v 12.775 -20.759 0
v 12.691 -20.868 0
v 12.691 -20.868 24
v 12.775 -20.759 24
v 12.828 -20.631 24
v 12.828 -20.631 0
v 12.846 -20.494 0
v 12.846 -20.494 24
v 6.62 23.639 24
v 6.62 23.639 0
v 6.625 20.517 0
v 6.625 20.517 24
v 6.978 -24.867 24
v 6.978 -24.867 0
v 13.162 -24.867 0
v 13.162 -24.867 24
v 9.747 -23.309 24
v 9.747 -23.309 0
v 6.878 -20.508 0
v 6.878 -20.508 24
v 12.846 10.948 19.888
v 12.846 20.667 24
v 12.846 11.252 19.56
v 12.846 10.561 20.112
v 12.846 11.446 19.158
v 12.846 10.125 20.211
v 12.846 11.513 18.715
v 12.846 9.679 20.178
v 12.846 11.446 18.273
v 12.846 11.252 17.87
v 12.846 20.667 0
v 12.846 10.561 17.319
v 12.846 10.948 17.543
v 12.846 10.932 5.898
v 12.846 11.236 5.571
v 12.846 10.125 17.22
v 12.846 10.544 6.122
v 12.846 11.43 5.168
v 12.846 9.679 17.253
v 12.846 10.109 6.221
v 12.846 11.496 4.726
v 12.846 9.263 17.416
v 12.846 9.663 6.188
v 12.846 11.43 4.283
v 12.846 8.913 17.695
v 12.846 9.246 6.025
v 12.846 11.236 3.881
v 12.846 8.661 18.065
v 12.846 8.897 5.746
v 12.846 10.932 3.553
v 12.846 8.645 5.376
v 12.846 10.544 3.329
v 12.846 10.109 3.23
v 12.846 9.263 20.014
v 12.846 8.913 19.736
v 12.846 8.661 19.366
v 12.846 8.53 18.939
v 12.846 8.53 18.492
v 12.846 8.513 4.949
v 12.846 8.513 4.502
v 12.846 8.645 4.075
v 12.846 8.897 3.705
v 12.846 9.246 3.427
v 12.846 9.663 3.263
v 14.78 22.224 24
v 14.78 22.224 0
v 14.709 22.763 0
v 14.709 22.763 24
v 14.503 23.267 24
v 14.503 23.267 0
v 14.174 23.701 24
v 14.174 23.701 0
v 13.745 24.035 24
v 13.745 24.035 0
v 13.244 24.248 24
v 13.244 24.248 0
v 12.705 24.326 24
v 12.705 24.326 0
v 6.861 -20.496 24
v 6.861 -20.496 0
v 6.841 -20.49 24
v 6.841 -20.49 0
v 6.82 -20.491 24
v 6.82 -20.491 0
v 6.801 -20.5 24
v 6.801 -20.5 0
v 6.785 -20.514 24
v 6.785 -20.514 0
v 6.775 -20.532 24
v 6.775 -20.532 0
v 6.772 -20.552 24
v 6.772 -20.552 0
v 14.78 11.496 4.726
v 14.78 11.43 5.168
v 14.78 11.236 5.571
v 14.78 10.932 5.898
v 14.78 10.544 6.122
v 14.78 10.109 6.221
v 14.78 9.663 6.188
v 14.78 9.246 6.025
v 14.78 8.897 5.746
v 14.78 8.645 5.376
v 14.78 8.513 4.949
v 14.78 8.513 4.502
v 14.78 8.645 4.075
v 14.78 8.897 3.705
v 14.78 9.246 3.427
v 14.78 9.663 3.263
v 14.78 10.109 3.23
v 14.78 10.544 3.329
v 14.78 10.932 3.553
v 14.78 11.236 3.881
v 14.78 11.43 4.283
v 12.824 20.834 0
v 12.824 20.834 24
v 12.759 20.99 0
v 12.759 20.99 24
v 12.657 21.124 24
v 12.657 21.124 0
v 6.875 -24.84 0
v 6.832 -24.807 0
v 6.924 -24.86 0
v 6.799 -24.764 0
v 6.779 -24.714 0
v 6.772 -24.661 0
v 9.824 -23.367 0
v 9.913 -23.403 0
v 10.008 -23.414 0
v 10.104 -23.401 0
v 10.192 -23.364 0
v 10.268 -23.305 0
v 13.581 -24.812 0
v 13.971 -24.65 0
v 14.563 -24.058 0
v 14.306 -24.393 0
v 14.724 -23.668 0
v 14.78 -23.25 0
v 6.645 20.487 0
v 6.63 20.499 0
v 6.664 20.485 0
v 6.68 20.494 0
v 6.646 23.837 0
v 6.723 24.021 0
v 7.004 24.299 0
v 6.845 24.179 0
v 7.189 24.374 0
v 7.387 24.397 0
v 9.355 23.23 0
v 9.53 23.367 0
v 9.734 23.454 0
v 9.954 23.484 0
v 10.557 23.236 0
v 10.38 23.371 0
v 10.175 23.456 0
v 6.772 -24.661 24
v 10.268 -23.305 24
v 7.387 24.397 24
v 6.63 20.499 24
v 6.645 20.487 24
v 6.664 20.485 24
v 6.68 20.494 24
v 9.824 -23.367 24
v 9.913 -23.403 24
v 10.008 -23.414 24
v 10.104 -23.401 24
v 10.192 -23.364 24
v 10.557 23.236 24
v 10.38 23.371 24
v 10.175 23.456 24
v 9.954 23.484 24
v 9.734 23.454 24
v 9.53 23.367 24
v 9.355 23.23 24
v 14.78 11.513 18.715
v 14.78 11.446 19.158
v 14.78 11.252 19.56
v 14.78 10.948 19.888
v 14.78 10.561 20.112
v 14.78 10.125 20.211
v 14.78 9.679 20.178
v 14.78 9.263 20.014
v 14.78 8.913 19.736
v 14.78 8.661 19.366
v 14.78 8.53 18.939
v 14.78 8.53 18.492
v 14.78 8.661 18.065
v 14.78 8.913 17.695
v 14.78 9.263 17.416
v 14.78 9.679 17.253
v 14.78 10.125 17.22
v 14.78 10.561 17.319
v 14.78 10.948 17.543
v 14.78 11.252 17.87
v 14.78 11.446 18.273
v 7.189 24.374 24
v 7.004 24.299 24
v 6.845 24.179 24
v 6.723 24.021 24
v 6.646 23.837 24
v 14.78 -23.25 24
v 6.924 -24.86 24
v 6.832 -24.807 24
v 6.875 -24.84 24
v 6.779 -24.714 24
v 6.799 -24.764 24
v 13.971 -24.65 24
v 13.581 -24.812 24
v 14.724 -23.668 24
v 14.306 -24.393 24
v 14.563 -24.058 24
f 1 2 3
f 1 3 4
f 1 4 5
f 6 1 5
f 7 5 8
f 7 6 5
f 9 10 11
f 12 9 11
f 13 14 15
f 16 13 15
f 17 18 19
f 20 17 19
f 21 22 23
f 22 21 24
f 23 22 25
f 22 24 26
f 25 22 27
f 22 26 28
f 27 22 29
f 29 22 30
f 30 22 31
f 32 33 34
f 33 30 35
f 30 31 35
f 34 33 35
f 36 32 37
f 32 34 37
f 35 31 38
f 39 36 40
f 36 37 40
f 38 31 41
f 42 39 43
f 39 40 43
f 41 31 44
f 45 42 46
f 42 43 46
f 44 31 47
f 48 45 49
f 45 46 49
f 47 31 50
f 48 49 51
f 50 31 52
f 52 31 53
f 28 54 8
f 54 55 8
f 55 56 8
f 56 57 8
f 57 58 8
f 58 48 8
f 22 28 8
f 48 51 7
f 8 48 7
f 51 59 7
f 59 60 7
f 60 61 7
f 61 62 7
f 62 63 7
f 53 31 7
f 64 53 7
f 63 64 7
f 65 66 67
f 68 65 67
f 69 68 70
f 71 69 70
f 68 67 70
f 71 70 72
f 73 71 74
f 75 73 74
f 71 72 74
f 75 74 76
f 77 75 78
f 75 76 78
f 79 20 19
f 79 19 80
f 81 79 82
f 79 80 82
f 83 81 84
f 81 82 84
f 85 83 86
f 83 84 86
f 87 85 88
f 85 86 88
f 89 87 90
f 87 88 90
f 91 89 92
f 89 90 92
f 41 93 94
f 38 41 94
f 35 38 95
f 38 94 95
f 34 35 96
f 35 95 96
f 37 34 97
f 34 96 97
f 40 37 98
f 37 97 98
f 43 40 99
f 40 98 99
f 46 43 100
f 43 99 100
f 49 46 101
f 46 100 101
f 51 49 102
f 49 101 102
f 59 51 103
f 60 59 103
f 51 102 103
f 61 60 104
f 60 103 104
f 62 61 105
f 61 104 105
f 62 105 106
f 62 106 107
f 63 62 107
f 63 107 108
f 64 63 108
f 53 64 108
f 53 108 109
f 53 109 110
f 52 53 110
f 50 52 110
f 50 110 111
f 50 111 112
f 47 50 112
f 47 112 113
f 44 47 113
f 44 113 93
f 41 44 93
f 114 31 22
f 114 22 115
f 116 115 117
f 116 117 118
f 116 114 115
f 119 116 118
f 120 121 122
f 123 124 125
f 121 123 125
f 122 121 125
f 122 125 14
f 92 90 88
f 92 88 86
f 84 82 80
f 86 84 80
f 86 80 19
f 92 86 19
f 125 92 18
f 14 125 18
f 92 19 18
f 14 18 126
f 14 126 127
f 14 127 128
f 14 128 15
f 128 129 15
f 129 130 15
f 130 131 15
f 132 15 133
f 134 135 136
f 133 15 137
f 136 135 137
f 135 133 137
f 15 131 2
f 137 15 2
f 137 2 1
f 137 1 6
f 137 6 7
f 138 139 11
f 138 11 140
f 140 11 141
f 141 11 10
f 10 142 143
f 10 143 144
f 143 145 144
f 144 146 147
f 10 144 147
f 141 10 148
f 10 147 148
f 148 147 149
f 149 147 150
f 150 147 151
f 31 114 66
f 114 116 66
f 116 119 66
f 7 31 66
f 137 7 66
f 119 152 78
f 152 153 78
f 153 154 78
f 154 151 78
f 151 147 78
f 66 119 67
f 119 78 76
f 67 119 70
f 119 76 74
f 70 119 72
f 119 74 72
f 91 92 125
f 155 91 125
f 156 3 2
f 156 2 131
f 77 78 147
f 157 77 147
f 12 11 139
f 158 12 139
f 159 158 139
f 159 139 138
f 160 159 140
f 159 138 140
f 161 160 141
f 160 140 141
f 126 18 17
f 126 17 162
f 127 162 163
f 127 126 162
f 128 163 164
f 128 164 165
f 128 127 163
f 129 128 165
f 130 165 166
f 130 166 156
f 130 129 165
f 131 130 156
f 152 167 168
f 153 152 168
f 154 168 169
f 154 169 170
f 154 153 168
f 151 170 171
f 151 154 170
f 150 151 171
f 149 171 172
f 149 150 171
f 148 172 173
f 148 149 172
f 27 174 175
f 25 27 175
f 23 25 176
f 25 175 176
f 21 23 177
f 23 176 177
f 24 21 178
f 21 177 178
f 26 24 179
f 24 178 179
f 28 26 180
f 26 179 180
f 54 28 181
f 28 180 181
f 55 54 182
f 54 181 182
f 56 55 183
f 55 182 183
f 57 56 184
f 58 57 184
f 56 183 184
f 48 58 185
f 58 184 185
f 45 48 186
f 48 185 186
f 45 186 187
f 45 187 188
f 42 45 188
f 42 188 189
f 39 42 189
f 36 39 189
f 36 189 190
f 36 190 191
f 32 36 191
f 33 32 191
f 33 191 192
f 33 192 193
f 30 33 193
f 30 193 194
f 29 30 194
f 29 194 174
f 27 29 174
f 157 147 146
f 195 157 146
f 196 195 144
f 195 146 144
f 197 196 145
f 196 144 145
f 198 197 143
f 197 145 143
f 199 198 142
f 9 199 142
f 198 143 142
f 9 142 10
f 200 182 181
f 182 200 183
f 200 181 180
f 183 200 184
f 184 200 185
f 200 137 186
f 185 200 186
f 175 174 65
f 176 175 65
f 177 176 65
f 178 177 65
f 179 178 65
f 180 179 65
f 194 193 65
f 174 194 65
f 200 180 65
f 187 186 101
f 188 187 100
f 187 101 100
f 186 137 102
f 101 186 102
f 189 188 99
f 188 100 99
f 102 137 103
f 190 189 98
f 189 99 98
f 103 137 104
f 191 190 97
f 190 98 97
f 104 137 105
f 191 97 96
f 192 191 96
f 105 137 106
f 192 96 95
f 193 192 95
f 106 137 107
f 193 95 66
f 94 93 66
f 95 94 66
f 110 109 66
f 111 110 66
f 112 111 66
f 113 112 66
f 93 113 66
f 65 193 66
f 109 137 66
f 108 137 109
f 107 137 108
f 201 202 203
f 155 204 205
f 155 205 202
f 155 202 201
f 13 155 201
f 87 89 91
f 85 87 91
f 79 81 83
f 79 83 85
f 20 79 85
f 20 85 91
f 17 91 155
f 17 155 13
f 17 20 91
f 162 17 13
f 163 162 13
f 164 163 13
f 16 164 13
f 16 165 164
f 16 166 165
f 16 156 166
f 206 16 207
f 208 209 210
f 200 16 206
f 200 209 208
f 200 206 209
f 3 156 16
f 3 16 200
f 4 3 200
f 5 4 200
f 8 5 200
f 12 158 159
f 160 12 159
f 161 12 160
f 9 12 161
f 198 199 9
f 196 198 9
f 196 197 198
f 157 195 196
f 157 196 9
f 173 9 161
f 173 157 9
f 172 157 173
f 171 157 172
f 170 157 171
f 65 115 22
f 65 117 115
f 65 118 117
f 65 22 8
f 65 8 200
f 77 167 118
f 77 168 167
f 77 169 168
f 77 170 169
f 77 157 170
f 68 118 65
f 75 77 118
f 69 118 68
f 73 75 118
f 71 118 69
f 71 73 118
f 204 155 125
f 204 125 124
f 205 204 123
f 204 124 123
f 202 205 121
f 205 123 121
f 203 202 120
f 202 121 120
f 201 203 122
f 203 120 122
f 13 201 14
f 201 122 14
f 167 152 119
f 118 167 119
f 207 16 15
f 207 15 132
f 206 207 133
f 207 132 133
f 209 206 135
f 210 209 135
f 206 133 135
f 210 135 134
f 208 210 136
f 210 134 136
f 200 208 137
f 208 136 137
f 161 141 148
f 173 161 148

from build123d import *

# Parameters (mm, degrees)
PAD_DEPTH    = 24
SKETCH_R     = 1.5
POCKET_DEPTH = 5


with BuildPart() as part:
    # Sketch002 → Pad (new body)
    with BuildSketch(Plane.XY):
        with BuildLine():
            Line((10.556671, 23.235573), (12.656862, 21.124397))
            ThreePointArc((12.845641, 20.666956), (12.796592, 20.914388), (12.656862, 21.124397))
            Line((12.845641, 20.666956), (12.845641, -20.493586))
            ThreePointArc((12.691003, -20.868422), (12.805464, -20.696326), (12.845641, -20.493586))
            Line((12.691003, -20.868422), (10.268132, -23.3051))
            ThreePointArc((9.74691, -23.308954), (10.008314, -23.414281), (10.268132, -23.3051))
            Line((9.74691, -23.308954), (6.877814, -20.507596))
            ThreePointArc((6.877814, -20.507596), (6.80996, -20.49473), (6.771762, -20.552268))
            Line((6.771762, -20.552268), (6.771762, -24.661169))
            ThreePointArc((6.771762, -24.661169), (6.832076, -24.80678), (6.977688, -24.867095))
            Line((6.977688, -24.867095), (13.162281, -24.867095))
            ThreePointArc((13.162281, -24.867095), (14.305884, -24.393399), (14.77958, -23.249796))
            Line((14.77958, -23.249796), (14.77958, 22.223828))
            ThreePointArc((14.77958, 22.223828), (14.173704, 23.700512), (12.705269, 24.326117))
            Line((12.705269, 24.326117), (7.387288, 24.397368))
            ThreePointArc((7.387288, 24.397368), (6.844792, 24.178762), (6.619818, 23.638875))
            Line((6.619818, 23.638875), (6.624912, 20.517001))
            ThreePointArc((6.624912, 20.517001), (6.645107, 20.487042), (6.680477, 20.494409))
            Line((6.680477, 20.494409), (9.354538, 23.230274))
            ThreePointArc((10.556671, 23.235573), (9.954496, 23.484367), (9.354538, 23.230274))
        make_face()
    extrude(amount=PAD_DEPTH)

    # Sketch → Pocket (cut)
    with BuildSketch(Plane.YZ.offset(14.77958)):
        with Locations((9.996471, 4.725631)):
            Circle(SKETCH_R)
        with Locations((10.01284, 18.715395)):
            Circle(SKETCH_R)
    extrude(amount=-POCKET_DEPTH, mode=Mode.SUBTRACT)


solid = part.part
